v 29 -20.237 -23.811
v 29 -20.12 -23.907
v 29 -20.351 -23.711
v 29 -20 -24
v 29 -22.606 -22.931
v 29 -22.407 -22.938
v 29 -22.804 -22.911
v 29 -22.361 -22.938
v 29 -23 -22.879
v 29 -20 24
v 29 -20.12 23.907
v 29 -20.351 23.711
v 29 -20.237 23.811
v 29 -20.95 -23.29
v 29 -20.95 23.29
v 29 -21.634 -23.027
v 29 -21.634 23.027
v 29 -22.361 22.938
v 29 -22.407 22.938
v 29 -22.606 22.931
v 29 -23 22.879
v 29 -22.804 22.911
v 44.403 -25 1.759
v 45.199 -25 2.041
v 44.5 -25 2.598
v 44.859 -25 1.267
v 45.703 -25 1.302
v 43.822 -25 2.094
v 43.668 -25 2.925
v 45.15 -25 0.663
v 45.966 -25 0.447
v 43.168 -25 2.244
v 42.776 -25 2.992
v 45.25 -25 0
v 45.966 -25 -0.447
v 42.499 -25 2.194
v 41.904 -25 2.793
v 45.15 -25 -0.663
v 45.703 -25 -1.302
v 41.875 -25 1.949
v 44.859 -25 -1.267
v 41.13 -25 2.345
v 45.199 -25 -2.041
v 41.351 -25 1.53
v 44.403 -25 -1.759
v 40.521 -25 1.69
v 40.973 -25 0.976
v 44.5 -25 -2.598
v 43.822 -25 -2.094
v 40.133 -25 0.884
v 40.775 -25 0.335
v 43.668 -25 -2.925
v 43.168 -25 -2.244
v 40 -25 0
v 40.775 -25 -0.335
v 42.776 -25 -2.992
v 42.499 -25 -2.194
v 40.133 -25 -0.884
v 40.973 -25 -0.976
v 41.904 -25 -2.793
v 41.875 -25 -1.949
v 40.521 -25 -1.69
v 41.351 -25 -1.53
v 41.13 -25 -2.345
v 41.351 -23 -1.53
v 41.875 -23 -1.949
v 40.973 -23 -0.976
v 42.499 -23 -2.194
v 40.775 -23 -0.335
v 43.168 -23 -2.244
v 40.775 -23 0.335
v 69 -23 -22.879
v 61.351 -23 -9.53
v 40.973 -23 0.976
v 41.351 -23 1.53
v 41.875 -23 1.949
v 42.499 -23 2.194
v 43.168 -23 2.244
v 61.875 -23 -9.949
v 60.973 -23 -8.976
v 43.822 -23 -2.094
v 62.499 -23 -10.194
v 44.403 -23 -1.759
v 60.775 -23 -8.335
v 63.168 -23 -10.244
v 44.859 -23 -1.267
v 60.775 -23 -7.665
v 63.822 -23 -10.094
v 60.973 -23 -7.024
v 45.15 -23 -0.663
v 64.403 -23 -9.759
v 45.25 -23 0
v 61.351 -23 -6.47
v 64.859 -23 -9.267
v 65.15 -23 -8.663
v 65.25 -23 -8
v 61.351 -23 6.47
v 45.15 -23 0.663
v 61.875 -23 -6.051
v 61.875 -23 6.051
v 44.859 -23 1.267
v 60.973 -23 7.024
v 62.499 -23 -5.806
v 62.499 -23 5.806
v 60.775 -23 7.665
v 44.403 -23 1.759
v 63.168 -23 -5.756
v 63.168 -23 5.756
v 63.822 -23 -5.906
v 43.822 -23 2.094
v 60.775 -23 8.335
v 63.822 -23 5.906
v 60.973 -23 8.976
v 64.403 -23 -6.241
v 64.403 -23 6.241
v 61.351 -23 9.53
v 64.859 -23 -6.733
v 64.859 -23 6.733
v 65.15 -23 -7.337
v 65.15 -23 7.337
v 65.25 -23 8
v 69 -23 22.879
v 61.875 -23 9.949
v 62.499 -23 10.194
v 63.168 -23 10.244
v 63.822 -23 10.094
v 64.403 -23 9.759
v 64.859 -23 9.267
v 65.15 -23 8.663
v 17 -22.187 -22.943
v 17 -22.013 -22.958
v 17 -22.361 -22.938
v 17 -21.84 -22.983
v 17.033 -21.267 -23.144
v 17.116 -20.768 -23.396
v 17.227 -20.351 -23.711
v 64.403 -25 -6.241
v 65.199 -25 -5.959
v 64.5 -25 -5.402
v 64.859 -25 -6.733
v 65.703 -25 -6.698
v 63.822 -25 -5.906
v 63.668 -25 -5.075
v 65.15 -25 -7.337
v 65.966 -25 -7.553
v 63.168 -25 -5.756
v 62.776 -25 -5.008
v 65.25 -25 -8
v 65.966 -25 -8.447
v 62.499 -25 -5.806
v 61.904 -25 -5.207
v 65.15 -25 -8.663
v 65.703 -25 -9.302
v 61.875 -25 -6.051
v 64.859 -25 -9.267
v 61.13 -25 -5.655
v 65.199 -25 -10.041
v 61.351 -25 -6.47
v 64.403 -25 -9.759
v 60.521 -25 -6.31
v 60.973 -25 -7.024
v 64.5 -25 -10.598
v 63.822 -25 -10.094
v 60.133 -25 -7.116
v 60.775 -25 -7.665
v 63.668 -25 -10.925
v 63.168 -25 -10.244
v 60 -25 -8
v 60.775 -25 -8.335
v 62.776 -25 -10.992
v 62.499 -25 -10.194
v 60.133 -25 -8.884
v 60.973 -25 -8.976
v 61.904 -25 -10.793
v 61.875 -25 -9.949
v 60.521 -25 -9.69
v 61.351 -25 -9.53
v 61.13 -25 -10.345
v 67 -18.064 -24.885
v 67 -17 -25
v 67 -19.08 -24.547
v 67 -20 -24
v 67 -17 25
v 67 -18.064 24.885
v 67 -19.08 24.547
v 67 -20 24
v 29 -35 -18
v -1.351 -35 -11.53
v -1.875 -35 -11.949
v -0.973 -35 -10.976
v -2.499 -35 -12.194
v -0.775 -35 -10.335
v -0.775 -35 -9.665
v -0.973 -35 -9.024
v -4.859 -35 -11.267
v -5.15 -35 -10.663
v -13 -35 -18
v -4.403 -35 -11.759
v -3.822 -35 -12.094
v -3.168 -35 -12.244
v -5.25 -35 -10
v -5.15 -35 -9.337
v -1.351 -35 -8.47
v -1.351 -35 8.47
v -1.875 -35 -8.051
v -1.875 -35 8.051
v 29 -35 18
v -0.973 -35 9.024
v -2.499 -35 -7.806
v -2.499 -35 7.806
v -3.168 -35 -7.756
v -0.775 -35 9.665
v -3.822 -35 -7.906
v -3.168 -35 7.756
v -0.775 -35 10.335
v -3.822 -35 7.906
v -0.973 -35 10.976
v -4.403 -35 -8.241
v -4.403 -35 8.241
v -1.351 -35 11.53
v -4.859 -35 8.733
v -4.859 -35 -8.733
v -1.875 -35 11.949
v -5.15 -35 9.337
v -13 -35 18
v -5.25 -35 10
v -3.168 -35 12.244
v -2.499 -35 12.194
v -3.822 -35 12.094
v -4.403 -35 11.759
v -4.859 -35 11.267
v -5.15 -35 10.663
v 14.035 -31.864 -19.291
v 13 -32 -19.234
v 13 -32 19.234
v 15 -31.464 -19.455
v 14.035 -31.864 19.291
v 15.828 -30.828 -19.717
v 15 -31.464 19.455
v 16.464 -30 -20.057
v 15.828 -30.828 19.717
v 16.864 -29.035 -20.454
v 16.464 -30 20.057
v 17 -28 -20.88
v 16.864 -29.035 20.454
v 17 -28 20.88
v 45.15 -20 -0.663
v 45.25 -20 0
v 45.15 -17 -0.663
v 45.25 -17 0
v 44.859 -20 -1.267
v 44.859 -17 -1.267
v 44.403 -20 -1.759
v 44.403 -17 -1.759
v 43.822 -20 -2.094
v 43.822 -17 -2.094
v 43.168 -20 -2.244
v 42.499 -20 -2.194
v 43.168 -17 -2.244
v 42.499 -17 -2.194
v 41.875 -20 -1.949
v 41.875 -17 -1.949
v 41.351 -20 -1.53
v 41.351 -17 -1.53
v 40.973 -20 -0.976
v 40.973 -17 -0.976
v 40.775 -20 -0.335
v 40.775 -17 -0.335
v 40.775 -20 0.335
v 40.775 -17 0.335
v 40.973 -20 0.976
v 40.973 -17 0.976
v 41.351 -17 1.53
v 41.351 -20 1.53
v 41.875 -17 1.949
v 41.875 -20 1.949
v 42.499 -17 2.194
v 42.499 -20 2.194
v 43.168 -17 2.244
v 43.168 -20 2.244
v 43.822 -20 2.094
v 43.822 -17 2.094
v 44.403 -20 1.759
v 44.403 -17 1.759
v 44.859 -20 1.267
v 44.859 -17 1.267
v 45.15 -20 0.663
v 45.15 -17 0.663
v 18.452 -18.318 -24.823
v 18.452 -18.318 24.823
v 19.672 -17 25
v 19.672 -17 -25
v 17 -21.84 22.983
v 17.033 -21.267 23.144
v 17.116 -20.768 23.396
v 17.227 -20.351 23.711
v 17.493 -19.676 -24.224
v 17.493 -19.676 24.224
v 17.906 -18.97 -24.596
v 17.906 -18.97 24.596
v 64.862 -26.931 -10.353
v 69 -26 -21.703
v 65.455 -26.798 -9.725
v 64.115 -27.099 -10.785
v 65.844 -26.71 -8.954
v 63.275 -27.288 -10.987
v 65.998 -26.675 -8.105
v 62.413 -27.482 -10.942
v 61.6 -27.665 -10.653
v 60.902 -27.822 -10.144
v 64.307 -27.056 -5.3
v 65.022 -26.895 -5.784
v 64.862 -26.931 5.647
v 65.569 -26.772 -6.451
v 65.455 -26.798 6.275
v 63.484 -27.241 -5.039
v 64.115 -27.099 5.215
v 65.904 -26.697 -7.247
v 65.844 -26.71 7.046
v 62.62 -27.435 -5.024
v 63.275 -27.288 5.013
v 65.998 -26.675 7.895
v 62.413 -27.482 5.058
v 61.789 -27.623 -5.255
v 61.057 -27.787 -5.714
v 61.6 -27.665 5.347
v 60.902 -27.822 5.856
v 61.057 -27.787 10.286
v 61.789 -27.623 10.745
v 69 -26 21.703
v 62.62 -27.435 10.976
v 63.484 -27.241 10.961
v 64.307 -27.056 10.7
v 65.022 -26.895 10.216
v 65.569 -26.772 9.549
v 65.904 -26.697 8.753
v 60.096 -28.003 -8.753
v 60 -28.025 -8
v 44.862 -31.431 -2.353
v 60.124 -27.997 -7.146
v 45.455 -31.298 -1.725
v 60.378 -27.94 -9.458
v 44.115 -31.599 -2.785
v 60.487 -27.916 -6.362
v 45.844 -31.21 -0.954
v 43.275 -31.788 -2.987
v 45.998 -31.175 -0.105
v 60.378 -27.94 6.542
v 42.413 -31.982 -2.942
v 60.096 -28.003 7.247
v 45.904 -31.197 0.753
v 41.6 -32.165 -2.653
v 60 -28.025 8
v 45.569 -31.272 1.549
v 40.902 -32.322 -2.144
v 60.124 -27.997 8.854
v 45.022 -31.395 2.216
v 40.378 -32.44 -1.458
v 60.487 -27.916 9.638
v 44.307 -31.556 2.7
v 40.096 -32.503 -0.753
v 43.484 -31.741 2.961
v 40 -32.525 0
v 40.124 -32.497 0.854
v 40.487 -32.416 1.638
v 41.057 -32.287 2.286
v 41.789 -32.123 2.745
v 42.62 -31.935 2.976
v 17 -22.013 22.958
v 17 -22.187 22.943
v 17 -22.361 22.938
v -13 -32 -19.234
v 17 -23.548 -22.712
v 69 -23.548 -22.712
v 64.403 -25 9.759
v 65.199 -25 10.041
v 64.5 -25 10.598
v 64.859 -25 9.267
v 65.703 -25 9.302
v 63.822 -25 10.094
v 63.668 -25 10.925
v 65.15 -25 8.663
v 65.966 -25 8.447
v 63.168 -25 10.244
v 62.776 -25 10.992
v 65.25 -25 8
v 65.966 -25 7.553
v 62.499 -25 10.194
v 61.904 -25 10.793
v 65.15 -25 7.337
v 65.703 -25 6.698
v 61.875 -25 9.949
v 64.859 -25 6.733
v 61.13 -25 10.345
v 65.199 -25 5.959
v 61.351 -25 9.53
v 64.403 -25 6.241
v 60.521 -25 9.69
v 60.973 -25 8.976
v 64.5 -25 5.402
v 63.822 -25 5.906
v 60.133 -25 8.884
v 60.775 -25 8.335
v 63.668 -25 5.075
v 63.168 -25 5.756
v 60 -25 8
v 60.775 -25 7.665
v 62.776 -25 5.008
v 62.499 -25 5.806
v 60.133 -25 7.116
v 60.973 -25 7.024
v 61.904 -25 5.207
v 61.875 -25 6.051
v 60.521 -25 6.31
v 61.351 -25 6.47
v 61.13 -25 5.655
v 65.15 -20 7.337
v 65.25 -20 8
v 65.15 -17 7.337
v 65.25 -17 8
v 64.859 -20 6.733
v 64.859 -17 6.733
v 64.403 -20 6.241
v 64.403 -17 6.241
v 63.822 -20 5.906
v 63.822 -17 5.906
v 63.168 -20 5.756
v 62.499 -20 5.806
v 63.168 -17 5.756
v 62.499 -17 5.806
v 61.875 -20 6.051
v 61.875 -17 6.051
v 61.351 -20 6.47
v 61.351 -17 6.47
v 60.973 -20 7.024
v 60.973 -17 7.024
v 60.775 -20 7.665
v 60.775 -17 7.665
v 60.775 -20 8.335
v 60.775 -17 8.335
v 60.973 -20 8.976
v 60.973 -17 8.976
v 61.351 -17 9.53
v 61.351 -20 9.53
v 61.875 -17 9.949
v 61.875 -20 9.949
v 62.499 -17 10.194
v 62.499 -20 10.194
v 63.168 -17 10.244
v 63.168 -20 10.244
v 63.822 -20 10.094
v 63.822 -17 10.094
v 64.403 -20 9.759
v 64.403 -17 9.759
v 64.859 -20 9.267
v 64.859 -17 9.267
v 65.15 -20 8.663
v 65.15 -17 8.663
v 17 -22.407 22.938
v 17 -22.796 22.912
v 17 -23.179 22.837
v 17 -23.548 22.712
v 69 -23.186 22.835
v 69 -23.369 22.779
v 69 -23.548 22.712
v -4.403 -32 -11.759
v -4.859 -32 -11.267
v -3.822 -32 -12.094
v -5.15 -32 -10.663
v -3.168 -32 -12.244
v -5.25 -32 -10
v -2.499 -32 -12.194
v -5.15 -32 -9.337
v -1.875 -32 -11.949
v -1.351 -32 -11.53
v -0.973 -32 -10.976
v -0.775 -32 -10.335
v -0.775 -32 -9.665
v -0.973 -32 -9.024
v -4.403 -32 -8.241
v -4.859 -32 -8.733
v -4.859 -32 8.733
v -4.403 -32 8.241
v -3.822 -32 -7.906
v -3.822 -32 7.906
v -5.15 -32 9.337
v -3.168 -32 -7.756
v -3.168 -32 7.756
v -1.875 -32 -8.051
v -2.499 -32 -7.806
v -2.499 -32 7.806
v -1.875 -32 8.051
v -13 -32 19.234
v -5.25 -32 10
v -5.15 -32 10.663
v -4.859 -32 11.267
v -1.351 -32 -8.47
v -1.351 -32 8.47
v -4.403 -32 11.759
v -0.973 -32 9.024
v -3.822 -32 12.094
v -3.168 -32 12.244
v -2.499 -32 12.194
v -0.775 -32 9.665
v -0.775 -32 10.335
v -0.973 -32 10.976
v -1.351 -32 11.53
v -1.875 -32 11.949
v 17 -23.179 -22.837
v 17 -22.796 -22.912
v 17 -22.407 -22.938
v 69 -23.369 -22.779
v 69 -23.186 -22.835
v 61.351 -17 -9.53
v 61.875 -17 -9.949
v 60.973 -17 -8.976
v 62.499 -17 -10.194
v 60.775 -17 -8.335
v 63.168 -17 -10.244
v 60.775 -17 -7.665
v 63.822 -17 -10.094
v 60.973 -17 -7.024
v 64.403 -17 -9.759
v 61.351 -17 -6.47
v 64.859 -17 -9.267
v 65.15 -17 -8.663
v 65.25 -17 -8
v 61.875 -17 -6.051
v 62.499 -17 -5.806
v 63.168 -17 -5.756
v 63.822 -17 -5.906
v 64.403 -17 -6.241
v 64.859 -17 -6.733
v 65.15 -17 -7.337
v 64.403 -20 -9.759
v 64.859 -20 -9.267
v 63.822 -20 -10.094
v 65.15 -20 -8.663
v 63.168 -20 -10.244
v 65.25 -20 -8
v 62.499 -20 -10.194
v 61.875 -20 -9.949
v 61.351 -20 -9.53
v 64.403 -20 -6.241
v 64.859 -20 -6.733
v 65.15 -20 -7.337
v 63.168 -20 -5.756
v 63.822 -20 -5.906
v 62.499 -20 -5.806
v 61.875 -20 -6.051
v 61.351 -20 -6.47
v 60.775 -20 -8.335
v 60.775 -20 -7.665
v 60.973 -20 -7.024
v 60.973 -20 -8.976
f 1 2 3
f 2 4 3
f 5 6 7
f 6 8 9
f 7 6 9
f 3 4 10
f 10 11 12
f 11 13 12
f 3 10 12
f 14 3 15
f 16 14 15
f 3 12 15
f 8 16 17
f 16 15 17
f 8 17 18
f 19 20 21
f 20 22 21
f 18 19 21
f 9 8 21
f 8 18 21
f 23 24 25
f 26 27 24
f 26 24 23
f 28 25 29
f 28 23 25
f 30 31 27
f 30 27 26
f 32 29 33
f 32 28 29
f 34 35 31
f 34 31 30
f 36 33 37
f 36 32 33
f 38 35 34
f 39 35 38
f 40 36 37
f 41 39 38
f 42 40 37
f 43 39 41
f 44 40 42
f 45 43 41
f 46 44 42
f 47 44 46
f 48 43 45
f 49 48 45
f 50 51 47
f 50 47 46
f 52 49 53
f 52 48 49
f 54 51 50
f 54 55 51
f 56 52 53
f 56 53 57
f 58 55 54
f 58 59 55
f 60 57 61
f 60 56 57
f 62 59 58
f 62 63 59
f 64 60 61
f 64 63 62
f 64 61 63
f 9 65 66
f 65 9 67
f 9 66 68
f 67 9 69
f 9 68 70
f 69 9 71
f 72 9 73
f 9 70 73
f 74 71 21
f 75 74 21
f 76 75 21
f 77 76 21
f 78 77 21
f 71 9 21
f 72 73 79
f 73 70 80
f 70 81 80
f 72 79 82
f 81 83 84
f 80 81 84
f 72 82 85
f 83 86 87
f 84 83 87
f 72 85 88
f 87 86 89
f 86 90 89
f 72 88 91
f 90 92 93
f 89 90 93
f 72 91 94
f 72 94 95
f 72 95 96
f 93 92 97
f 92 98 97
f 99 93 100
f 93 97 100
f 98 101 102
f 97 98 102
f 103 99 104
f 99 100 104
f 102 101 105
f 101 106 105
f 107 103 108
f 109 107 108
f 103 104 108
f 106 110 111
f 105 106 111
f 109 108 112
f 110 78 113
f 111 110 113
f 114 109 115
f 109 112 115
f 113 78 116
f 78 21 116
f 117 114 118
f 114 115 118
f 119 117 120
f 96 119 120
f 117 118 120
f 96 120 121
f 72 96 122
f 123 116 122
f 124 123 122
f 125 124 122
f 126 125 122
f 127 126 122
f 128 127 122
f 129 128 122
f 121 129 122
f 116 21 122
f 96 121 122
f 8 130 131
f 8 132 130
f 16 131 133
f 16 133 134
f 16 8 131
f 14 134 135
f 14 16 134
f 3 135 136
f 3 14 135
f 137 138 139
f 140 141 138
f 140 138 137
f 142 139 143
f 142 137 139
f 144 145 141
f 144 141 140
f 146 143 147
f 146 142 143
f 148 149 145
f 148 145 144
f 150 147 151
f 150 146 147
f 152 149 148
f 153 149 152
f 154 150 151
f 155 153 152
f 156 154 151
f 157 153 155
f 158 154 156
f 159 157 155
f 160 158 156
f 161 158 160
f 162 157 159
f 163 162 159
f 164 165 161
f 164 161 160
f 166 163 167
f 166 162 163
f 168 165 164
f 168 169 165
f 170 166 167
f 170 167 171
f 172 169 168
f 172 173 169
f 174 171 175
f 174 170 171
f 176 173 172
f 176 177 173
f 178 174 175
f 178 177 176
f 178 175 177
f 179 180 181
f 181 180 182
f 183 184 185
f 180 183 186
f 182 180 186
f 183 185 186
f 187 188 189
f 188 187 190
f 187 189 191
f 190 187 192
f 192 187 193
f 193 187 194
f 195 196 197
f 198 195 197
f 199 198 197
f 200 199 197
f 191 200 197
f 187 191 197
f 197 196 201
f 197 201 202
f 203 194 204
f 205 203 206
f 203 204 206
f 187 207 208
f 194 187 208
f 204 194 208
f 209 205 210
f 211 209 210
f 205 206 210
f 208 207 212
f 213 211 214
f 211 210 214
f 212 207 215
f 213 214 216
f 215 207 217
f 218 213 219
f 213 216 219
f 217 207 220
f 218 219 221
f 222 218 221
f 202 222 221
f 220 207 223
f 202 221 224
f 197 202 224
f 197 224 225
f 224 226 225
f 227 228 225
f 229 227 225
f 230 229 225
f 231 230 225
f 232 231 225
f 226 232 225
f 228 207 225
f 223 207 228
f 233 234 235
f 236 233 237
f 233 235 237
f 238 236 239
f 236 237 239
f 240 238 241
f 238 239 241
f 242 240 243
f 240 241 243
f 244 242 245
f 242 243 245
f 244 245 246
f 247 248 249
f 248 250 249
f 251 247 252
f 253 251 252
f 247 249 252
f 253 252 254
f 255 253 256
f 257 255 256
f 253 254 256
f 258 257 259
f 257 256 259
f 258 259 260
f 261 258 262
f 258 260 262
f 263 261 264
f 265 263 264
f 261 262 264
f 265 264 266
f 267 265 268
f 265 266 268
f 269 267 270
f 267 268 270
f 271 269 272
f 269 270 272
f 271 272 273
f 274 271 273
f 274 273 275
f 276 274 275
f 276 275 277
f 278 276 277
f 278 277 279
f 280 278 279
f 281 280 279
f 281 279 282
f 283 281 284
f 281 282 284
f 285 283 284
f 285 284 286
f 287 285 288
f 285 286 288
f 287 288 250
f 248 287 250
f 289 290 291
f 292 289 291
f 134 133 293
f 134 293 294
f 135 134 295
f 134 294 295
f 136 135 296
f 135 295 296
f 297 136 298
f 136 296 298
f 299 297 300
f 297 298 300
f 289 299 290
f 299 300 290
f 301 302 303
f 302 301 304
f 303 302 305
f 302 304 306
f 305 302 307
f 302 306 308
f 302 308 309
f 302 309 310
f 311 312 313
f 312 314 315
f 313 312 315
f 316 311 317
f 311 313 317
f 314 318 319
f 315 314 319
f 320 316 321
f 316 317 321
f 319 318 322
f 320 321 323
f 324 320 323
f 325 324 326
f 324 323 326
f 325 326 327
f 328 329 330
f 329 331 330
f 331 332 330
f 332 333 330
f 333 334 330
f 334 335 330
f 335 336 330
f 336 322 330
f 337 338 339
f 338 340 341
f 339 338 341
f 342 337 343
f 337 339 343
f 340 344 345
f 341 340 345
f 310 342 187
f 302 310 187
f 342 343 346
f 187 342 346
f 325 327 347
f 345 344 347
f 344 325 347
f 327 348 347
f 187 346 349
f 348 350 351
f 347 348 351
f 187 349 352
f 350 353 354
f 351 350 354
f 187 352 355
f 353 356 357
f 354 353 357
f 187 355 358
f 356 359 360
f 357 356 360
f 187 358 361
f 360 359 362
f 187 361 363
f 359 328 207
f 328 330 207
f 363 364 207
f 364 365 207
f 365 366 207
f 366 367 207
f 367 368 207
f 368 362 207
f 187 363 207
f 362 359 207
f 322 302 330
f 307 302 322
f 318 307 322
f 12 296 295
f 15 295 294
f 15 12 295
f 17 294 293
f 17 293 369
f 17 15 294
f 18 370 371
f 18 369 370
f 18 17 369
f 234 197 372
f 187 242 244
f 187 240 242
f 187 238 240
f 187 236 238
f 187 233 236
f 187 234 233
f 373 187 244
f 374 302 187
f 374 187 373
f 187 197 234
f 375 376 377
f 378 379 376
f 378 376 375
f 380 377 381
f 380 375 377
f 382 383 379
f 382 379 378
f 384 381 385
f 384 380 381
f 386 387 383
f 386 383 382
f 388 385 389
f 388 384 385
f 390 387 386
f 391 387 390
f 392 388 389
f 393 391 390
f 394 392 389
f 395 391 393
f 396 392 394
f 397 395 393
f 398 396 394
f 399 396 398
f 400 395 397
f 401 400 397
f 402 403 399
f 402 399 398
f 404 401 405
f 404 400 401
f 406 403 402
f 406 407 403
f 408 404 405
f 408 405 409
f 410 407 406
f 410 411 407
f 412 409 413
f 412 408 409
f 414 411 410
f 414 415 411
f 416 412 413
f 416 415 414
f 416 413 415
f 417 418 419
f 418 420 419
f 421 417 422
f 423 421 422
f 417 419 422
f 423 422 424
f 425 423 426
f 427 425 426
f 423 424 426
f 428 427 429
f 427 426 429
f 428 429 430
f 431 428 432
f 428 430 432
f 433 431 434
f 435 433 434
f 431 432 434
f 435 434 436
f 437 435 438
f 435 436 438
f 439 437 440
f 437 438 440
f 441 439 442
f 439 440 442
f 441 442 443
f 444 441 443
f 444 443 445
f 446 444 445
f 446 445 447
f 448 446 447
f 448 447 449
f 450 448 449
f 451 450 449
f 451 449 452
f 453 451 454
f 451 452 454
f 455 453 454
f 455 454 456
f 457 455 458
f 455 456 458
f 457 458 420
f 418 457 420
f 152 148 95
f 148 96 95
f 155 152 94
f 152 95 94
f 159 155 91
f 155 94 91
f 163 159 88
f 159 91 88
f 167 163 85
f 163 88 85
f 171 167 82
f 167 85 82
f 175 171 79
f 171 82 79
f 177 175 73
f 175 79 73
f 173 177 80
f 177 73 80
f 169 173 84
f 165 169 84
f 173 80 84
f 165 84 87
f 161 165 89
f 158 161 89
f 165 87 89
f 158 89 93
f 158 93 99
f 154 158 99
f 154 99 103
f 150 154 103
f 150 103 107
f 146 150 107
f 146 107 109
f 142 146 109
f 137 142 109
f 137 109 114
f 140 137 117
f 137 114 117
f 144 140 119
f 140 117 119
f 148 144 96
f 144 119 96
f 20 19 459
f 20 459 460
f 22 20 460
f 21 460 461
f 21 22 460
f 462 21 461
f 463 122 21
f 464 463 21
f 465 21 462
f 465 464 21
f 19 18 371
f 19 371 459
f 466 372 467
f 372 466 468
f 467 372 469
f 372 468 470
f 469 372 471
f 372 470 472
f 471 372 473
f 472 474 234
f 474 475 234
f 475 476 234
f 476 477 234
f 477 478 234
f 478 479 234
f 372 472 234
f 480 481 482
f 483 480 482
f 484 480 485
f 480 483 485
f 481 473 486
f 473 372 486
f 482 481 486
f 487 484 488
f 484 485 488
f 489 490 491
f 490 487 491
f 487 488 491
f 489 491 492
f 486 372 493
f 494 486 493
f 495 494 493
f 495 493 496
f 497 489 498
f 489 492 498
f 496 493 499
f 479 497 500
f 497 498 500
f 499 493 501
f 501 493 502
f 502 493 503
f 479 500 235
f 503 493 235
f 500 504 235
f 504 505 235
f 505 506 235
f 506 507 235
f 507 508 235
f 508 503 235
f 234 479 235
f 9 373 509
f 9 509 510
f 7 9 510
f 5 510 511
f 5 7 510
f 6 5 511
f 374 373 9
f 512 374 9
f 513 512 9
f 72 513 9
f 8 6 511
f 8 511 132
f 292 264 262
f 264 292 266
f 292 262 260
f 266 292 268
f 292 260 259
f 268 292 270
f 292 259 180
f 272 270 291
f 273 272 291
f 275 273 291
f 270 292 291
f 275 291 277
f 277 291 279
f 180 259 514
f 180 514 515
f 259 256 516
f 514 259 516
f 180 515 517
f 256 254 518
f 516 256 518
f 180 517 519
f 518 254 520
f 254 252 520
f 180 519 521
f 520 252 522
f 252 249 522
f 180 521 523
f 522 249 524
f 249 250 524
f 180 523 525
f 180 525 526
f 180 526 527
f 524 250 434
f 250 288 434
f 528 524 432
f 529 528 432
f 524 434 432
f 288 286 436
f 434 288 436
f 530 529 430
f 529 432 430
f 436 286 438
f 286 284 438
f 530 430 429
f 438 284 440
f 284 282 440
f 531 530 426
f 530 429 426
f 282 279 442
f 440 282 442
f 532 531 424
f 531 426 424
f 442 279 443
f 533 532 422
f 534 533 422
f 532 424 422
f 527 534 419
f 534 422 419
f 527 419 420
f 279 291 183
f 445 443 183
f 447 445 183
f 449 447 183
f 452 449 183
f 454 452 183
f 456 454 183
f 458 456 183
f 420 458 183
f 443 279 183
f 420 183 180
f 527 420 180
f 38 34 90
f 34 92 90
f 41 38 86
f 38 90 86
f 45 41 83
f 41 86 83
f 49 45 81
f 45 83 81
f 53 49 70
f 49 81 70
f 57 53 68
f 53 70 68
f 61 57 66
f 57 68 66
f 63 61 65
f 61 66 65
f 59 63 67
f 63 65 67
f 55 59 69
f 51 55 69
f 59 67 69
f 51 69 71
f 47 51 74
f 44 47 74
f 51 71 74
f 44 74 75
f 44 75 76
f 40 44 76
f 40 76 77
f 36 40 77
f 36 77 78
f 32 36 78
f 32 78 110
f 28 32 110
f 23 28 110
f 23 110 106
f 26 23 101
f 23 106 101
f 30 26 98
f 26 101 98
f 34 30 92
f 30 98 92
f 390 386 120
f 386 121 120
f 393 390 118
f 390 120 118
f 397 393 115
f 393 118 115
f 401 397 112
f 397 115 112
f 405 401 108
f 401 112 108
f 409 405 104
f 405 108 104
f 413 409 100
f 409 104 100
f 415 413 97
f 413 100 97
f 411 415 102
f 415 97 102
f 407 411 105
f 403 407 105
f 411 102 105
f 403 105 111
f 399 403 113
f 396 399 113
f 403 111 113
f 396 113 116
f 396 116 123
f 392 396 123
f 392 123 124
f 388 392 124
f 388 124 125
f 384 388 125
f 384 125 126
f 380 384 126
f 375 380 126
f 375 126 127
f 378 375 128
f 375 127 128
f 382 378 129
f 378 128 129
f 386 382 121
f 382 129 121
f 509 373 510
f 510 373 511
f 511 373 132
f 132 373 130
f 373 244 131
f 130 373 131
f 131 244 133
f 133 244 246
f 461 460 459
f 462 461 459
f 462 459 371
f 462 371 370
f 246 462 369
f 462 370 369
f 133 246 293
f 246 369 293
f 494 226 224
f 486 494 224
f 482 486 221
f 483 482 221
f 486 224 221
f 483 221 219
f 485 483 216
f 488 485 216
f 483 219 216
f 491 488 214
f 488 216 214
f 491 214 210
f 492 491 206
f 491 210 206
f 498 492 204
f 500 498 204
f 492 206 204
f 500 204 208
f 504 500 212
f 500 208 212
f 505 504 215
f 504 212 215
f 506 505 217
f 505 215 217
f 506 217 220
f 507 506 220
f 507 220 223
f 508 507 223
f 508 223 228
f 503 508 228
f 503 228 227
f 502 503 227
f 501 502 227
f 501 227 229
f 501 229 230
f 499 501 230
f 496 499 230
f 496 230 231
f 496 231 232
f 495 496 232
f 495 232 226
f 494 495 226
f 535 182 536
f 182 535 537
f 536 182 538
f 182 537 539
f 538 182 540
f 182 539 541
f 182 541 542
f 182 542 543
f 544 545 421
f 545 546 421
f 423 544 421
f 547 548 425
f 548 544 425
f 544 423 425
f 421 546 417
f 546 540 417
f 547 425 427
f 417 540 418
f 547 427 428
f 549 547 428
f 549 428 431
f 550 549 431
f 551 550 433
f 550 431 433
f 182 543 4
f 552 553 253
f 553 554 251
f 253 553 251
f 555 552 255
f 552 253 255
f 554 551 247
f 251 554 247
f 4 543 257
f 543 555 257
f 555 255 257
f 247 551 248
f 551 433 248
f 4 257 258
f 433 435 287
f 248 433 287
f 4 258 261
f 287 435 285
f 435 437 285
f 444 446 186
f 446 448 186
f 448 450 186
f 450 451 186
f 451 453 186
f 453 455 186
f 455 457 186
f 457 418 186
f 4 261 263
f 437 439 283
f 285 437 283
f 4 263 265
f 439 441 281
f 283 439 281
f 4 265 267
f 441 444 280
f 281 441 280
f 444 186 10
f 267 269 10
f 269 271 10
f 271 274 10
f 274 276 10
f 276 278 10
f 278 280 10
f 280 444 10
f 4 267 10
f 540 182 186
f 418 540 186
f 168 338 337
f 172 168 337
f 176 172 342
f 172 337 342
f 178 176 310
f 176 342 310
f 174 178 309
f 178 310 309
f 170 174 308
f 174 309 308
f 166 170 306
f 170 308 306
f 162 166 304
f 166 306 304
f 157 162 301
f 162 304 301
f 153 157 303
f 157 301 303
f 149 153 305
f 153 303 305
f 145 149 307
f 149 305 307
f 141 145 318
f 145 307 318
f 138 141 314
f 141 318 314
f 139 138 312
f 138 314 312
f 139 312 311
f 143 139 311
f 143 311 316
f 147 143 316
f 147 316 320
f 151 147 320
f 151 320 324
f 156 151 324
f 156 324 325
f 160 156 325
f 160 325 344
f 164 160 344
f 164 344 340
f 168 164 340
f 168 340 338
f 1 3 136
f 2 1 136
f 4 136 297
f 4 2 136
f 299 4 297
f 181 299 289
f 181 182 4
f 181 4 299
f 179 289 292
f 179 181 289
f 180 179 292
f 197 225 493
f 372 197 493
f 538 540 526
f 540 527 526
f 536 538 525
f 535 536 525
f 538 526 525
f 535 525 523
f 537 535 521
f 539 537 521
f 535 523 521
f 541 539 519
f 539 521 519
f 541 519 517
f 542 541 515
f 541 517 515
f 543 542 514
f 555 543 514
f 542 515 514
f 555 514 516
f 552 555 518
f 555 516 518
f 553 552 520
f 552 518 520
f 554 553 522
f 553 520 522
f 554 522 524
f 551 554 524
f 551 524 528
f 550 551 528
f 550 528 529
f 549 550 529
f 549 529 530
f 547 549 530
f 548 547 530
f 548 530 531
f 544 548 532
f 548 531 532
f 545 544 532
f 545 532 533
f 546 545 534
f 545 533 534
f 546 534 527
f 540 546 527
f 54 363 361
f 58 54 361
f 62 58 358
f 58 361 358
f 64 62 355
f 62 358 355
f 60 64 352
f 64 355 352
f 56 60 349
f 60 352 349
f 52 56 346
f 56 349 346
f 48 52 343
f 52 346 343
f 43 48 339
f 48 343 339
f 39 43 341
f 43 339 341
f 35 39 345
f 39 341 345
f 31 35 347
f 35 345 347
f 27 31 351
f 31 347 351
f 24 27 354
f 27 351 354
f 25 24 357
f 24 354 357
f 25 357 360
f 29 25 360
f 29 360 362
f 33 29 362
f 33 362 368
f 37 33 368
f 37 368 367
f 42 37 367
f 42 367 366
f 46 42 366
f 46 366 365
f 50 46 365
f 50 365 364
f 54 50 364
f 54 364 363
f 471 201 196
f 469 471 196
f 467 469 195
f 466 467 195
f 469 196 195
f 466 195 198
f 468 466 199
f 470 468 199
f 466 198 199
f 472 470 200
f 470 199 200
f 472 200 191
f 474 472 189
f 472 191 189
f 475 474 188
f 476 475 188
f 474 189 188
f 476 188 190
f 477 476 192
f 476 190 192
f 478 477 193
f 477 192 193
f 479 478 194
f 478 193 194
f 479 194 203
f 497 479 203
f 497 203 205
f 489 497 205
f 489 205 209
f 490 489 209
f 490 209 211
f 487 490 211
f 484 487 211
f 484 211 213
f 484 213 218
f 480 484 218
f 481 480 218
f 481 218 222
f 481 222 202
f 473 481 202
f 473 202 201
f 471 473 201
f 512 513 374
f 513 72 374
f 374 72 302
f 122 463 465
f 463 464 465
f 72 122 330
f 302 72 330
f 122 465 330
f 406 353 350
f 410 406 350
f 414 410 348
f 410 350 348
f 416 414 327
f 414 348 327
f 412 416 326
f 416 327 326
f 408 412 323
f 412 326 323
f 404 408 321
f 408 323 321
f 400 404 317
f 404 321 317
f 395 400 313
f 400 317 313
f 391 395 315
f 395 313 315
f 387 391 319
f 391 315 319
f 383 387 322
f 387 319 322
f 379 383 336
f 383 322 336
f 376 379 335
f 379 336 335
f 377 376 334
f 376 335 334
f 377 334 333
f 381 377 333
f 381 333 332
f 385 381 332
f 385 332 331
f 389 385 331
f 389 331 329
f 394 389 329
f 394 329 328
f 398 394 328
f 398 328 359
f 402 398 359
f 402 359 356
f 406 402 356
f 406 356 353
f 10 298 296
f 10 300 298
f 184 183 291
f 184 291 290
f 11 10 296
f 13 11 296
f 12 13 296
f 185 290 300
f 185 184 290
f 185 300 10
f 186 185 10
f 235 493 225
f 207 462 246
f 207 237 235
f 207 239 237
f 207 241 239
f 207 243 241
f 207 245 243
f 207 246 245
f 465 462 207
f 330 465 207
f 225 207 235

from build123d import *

# Parameters (mm, degrees)
BOSS_EXTRUDE1_DEPTH = 30
CUT_EXTRUDE1_DEPTH  = 82
SKETCH3_R           = 2.25
CUT_EXTRUDE2_DEPTH  = 60
HOLE2_D             = 4.5
HOLE2_CBORE_D       = 6
HOLE2_CBORE_DEPTH   = 10


with BuildPart() as part:
    # Sketch1 → Boss-Extrude1 (new body, symmetric)
    with BuildSketch(Plane.XY):
        with BuildLine():
            Line((17, -28), (17, -21.840329668))
            ThreePointArc((17, -21.840329668), (17.377125597, -19.935327763), (18.451612903, -18.31769585))
            ThreePointArc((18.451612903, -18.31769585), (19.07334688, -17.669392712), (19.672315573, -17))
            Line((19.672315573, -17), (67, -17))
            Line((67, -17), (67, -20))
            Line((67, -20), (29, -20))
            Line((29, -20), (29, -23))
            Line((29, -23), (69, -23))
            Line((69, -23), (69, -26))
            Line((69, -26), (29, -35))
            Line((29, -35), (-13, -35))
            Line((-13, -35), (-13, -32))
            Line((-13, -32), (13, -32))
            ThreePointArc((13, -32), (15.828427125, -30.828427125), (17, -28))
        make_face()
    extrude(amount=BOSS_EXTRUDE1_DEPTH, both=True)

    # Sketch2 → Cut-Extrude1 (cut)
    with BuildSketch(Plane(origin=(69, 0, 0), x_dir=(0, 0, -1), z_dir=(1, 0, 0))):
        with BuildLine():
            Line((-22.937838499, -22.36116349), (-22.937838499, -22.406895186))
            ThreePointArc((-22.937838499, -22.406895186), (-22.880874155, -22.988738058), (-22.712144413, -23.548484732))
            Line((-22.712144413, -23.548484732), (-18, -35))
            Line((-18, -35), (-30, -35))
            Line((-30, -35), (-30, -17))
            Line((-30, -17), (-25, -17))
            ThreePointArc((-25, -17), (-24.666676832, -18.795028508), (-23.711149062, -20.350727181))
            ThreePointArc((-23.711149062, -20.350727181), (-23.1378324, -21.284146385), (-22.937838499, -22.36116349))
        make_face()
        with BuildLine():
            Line((30, -35), (18, -35))
            Line((18, -35), (22.712144413, -23.548484732))
            ThreePointArc((22.712144413, -23.548484732), (22.880874155, -22.988738058), (22.937838499, -22.406895186))
            Line((22.937838499, -22.406895186), (22.937838499, -22.36116349))
            ThreePointArc((22.937838499, -22.36116349), (23.1378324, -21.284146385), (23.711149062, -20.350727181))
            ThreePointArc((23.711149062, -20.350727181), (24.666676832, -18.795028508), (25, -17))
            Line((25, -17), (30, -17))
            Line((30, -17), (30, -35))
        make_face()
    extrude(amount=-CUT_EXTRUDE1_DEPTH, mode=Mode.SUBTRACT)

    # Sketch3 → Cut-Extrude2 (cut)
    with BuildSketch(Plane(origin=(0, -35, 0), x_dir=(-1, 0, 0), z_dir=(0, -1, 0))):
        with Locations((3, -10)):
            Circle(SKETCH3_R)
        with Locations((3, 10)):
            Circle(SKETCH3_R)
    extrude(amount=-CUT_EXTRUDE2_DEPTH, mode=Mode.SUBTRACT)

    # Hole2 (through all)
    with Locations(Plane(origin=(0, -35, 0), x_dir=(-1, 0, 0), z_dir=(0, -1, 0))):
        with Locations((-63, 8), (-63, -8), (-43, 0)):
            CounterBoreHole(HOLE2_D / 2, HOLE2_CBORE_D / 2, HOLE2_CBORE_DEPTH)


solid = part.part
